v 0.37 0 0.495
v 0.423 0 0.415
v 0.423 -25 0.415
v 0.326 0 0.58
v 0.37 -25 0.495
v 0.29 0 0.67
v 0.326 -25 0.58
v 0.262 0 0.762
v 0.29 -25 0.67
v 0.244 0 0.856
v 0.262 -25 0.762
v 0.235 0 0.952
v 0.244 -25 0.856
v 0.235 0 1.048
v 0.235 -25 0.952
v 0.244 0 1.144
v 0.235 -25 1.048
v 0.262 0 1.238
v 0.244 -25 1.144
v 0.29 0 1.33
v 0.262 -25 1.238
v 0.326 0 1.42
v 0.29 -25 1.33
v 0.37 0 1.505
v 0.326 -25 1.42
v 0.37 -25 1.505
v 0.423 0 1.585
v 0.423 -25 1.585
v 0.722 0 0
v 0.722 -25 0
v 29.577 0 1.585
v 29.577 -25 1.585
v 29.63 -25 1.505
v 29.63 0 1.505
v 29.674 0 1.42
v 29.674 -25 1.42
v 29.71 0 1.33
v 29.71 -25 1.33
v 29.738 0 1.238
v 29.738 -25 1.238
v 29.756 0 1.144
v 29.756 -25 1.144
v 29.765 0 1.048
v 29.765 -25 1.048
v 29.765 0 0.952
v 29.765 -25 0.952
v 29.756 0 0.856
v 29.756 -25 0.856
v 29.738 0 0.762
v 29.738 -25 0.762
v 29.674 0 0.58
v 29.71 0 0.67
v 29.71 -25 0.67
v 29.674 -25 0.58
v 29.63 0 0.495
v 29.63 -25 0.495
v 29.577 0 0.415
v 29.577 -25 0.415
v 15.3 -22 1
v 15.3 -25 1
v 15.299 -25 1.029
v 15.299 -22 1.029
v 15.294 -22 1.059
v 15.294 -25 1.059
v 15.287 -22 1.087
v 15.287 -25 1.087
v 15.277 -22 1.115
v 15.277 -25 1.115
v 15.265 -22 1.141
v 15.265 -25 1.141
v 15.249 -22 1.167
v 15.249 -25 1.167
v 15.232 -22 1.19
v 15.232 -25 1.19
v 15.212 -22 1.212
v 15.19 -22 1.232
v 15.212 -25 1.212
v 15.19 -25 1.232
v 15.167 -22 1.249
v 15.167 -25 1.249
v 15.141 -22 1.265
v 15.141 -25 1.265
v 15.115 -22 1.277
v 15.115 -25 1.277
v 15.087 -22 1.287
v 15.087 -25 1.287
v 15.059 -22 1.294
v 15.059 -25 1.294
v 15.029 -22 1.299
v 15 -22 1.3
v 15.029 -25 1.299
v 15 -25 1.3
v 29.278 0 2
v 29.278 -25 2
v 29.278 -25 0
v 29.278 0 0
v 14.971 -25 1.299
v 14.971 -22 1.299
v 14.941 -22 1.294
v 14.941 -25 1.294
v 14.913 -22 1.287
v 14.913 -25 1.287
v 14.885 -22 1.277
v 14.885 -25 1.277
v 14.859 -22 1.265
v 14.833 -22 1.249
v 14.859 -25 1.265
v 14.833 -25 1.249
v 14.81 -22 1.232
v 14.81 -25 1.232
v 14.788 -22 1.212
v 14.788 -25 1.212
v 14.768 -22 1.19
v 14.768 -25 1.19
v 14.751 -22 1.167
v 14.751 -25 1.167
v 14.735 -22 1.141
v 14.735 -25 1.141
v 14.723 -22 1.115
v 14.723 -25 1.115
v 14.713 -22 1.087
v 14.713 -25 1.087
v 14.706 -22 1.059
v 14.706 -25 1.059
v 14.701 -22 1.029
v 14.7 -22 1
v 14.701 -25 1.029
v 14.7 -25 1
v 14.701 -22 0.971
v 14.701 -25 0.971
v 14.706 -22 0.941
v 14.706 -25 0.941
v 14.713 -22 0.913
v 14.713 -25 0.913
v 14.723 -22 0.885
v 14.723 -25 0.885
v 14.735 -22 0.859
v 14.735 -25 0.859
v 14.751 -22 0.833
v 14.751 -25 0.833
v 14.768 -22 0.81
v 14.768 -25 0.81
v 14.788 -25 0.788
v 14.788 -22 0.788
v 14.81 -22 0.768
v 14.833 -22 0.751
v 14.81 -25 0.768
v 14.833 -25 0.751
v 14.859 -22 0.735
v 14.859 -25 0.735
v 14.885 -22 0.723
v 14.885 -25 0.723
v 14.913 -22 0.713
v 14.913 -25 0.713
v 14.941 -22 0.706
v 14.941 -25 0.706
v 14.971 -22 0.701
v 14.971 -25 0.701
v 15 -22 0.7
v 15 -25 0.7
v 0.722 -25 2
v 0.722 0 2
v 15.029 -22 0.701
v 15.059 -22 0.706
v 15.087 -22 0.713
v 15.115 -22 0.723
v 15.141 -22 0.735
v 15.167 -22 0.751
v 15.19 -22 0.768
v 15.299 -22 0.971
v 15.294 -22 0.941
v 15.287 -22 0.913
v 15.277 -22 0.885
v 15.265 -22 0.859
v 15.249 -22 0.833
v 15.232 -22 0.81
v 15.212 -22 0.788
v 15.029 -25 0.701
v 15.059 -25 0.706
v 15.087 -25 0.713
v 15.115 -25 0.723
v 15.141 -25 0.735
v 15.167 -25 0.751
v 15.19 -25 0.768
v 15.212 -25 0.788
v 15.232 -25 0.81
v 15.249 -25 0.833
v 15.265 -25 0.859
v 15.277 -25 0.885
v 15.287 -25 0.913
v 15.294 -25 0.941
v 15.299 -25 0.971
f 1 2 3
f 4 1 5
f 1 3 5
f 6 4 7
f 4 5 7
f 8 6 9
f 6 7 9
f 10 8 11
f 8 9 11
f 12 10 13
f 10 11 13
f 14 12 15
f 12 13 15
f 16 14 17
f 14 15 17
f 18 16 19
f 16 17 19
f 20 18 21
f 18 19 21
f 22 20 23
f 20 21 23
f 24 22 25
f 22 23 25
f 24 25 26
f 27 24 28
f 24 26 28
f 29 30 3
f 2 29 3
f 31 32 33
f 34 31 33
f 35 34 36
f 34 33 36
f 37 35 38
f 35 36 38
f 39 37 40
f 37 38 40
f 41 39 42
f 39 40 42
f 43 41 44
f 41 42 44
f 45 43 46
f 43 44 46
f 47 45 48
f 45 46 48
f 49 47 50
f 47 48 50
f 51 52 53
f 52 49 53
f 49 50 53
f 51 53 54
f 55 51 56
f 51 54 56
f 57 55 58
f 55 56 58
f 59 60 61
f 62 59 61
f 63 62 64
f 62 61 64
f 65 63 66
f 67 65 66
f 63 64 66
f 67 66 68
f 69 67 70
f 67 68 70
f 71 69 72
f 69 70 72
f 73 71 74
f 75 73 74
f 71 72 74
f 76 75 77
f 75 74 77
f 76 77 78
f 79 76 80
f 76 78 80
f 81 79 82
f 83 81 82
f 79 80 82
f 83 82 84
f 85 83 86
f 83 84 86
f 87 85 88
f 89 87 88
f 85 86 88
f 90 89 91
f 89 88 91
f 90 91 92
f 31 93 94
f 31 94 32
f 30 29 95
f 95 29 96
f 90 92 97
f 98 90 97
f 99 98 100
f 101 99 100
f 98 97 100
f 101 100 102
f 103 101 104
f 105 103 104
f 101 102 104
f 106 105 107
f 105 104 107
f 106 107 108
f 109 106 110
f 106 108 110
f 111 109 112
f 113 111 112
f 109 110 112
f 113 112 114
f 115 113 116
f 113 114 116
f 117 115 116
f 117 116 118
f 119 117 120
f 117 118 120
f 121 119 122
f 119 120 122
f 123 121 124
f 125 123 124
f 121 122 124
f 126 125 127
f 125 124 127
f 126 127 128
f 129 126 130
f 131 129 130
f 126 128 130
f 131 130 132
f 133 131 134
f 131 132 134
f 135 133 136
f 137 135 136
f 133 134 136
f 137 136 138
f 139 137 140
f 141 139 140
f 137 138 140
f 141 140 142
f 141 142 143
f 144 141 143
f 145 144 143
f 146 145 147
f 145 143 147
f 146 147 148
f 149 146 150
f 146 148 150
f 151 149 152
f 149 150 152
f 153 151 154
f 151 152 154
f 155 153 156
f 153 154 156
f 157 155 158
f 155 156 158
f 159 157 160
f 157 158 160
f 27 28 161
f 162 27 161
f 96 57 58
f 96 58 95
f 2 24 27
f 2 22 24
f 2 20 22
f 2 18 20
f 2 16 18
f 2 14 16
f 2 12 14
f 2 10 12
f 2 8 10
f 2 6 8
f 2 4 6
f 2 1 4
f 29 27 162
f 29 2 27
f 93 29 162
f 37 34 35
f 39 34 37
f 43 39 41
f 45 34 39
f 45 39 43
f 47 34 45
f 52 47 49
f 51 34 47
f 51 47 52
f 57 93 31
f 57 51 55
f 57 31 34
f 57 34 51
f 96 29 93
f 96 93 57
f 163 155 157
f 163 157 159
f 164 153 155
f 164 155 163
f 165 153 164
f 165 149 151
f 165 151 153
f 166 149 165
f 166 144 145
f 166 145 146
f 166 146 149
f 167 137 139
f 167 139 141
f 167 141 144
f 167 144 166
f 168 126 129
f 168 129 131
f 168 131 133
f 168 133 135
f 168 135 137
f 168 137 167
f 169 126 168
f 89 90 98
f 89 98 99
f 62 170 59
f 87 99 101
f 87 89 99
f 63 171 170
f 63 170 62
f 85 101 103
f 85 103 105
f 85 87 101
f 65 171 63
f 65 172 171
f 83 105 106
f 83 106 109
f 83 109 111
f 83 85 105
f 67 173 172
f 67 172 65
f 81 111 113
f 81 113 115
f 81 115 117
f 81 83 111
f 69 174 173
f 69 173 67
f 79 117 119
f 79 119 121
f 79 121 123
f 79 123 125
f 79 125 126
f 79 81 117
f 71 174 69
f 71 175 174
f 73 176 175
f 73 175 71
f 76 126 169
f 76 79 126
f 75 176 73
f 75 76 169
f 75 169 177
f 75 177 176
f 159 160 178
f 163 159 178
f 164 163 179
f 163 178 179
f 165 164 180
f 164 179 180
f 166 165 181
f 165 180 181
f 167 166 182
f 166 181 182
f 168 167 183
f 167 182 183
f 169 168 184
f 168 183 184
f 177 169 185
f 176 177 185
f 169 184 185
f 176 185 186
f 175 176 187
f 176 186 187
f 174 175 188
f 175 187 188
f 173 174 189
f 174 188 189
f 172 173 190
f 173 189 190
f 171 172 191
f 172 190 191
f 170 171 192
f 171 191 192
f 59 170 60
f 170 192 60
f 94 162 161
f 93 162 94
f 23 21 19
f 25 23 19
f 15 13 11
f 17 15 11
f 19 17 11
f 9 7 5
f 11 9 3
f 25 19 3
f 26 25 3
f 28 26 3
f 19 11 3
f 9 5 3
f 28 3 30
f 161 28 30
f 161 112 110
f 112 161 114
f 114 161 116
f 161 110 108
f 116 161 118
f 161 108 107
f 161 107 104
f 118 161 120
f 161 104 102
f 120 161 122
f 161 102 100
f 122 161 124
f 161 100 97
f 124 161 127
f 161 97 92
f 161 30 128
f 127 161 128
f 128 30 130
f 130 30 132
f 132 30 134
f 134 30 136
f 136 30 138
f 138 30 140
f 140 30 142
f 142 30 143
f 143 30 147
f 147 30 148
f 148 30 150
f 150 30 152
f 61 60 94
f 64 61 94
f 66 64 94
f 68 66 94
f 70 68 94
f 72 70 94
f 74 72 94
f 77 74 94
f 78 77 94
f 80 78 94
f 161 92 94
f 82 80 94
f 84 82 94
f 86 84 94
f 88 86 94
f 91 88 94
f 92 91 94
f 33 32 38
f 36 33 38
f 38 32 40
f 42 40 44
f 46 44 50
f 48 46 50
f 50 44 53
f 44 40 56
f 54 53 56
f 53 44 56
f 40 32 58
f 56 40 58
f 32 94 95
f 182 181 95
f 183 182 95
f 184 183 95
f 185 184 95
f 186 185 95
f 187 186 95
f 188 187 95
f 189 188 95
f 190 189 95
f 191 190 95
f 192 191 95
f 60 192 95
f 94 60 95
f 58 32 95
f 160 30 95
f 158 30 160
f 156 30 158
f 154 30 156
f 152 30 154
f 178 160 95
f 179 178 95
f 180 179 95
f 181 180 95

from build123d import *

# Parameters (mm, degrees)
SKETCH_1_W          = 30
SKETCH_1_H          = 25
EXTRUDE_1_DEPTH     = 2
CUT_EXTRUDE_1_DEPTH = 40.102429592
CUT_EXTRUDE_2_DEPTH = 3


with BuildPart() as part:
    # 草图1 → 凸台-拉伸1 (new body)
    with BuildSketch(Plane.XY):
        with Locations((15, -12.5)):
            Rectangle(SKETCH_1_W, SKETCH_1_H)
    extrude(amount=EXTRUDE_1_DEPTH)

    # 草图2 → 切除-拉伸1 (cut, through all)
    with BuildSketch(Plane.XZ.offset(25)):
        with BuildLine():
            Line((0.422813175, 1.585467977), (0.722179849, 2))
            Line((0.722179849, 2), (0, 2))
            Line((0, 2), (0, 1))
            Line((0, 1), (0, 0))
            Line((0, 0), (0.722179849, 0))
            Line((0.722179849, 0), (0.422813175, 0.414532023))
            ThreePointArc((0.422813175, 0.414532023), (0.233508708, 1), (0.422813175, 1.585467977))
        make_face()
        with BuildLine():
            Line((30, 0), (30, 1))
            Line((30, 1), (30, 2))
            Line((30, 2), (29.277820151, 2))
            Line((29.277820151, 2), (29.577186825, 1.585467977))
            ThreePointArc((29.577186825, 1.585467977), (29.766491292, 1), (29.577186825, 0.414532023))
            Line((29.577186825, 0.414532023), (29.277820151, 0))
            Line((29.277820151, 0), (30, 0))
        make_face()
    extrude(amount=-CUT_EXTRUDE_1_DEPTH, mode=Mode.SUBTRACT)

    # 草图3 → 切除-拉伸2 (cut)
    with BuildSketch(Plane.XZ.offset(25)):
        with BuildLine():
            ThreePointArc((15.3, 1), (15.212132034, 1.212132034), (15, 1.3))
            Line((15, 1.3), (15, 0.7))
            ThreePointArc((15, 0.7), (15.212132034, 0.787867966), (15.3, 1))
        make_face()
        with BuildLine():
            Line((15, 0.7), (15, 1.3))
            ThreePointArc((15, 1.3), (14.7, 1), (15, 0.7))
        make_face()
    extrude(amount=-CUT_EXTRUDE_2_DEPTH, mode=Mode.SUBTRACT)


solid = part.part
